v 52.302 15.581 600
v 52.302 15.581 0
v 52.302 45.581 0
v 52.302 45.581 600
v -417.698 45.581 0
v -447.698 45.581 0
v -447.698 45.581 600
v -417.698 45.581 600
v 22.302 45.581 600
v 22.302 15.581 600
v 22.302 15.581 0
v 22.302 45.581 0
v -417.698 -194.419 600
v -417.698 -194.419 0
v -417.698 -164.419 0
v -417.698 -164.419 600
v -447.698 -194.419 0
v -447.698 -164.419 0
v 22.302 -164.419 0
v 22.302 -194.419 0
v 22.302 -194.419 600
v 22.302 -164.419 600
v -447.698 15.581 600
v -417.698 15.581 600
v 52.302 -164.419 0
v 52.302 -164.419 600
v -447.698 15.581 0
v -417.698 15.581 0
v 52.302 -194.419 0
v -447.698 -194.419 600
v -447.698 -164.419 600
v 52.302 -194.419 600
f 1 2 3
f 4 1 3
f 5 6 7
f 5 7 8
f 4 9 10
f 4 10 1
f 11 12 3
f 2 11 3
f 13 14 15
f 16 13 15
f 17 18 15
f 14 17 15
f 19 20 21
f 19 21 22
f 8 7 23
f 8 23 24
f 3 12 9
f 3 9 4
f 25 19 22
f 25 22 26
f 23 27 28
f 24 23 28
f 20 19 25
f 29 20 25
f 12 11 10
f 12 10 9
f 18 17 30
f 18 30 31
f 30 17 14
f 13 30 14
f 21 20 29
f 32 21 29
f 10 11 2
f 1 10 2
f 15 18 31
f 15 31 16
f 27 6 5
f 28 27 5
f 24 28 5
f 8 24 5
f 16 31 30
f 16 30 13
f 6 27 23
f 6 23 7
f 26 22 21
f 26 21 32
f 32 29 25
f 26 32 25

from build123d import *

# Parameters (mm, degrees)
SKETCH_1_W        = 30
SKETCH_1_H        = 30
EXTRUDE_1_DEPTH   = 600
EXTRUDE_1_2_DEPTH = 600
EXTRUDE_1_3_DEPTH = 600
EXTRUDE_1_4_DEPTH = 600


with BuildPart() as part:
    # 草图1 → 凸台-拉伸1 (new body)
    with BuildSketch(Plane.XY):
        with Locations((-432.698412698, 30.58079164)):
            Rectangle(SKETCH_1_W, SKETCH_1_H)
    extrude(amount=EXTRUDE_1_DEPTH)


with BuildPart() as body_2:
    # 草图1 → Extrude 1 2 (new body)
    with BuildSketch(Plane.XY):
        with Locations((37.301587302, 30.58079164)):
            Rectangle(SKETCH_1_W, SKETCH_1_H)
    extrude(amount=EXTRUDE_1_2_DEPTH)


with BuildPart() as body_3:
    # 草图1 → Extrude 1 3 (new body)
    with BuildSketch(Plane.XY):
        with Locations((-432.698412698, -179.41920836)):
            Rectangle(SKETCH_1_W, SKETCH_1_H)
    extrude(amount=EXTRUDE_1_3_DEPTH)


with BuildPart() as body_4:
    # 草图1 → Extrude 1 4 (new body)
    with BuildSketch(Plane.XY):
        with Locations((37.301587302, -179.41920836)):
            Rectangle(SKETCH_1_W, SKETCH_1_H)
    extrude(amount=EXTRUDE_1_4_DEPTH)


solid = Compound([part.part, body_2.part, body_3.part, body_4.part])
